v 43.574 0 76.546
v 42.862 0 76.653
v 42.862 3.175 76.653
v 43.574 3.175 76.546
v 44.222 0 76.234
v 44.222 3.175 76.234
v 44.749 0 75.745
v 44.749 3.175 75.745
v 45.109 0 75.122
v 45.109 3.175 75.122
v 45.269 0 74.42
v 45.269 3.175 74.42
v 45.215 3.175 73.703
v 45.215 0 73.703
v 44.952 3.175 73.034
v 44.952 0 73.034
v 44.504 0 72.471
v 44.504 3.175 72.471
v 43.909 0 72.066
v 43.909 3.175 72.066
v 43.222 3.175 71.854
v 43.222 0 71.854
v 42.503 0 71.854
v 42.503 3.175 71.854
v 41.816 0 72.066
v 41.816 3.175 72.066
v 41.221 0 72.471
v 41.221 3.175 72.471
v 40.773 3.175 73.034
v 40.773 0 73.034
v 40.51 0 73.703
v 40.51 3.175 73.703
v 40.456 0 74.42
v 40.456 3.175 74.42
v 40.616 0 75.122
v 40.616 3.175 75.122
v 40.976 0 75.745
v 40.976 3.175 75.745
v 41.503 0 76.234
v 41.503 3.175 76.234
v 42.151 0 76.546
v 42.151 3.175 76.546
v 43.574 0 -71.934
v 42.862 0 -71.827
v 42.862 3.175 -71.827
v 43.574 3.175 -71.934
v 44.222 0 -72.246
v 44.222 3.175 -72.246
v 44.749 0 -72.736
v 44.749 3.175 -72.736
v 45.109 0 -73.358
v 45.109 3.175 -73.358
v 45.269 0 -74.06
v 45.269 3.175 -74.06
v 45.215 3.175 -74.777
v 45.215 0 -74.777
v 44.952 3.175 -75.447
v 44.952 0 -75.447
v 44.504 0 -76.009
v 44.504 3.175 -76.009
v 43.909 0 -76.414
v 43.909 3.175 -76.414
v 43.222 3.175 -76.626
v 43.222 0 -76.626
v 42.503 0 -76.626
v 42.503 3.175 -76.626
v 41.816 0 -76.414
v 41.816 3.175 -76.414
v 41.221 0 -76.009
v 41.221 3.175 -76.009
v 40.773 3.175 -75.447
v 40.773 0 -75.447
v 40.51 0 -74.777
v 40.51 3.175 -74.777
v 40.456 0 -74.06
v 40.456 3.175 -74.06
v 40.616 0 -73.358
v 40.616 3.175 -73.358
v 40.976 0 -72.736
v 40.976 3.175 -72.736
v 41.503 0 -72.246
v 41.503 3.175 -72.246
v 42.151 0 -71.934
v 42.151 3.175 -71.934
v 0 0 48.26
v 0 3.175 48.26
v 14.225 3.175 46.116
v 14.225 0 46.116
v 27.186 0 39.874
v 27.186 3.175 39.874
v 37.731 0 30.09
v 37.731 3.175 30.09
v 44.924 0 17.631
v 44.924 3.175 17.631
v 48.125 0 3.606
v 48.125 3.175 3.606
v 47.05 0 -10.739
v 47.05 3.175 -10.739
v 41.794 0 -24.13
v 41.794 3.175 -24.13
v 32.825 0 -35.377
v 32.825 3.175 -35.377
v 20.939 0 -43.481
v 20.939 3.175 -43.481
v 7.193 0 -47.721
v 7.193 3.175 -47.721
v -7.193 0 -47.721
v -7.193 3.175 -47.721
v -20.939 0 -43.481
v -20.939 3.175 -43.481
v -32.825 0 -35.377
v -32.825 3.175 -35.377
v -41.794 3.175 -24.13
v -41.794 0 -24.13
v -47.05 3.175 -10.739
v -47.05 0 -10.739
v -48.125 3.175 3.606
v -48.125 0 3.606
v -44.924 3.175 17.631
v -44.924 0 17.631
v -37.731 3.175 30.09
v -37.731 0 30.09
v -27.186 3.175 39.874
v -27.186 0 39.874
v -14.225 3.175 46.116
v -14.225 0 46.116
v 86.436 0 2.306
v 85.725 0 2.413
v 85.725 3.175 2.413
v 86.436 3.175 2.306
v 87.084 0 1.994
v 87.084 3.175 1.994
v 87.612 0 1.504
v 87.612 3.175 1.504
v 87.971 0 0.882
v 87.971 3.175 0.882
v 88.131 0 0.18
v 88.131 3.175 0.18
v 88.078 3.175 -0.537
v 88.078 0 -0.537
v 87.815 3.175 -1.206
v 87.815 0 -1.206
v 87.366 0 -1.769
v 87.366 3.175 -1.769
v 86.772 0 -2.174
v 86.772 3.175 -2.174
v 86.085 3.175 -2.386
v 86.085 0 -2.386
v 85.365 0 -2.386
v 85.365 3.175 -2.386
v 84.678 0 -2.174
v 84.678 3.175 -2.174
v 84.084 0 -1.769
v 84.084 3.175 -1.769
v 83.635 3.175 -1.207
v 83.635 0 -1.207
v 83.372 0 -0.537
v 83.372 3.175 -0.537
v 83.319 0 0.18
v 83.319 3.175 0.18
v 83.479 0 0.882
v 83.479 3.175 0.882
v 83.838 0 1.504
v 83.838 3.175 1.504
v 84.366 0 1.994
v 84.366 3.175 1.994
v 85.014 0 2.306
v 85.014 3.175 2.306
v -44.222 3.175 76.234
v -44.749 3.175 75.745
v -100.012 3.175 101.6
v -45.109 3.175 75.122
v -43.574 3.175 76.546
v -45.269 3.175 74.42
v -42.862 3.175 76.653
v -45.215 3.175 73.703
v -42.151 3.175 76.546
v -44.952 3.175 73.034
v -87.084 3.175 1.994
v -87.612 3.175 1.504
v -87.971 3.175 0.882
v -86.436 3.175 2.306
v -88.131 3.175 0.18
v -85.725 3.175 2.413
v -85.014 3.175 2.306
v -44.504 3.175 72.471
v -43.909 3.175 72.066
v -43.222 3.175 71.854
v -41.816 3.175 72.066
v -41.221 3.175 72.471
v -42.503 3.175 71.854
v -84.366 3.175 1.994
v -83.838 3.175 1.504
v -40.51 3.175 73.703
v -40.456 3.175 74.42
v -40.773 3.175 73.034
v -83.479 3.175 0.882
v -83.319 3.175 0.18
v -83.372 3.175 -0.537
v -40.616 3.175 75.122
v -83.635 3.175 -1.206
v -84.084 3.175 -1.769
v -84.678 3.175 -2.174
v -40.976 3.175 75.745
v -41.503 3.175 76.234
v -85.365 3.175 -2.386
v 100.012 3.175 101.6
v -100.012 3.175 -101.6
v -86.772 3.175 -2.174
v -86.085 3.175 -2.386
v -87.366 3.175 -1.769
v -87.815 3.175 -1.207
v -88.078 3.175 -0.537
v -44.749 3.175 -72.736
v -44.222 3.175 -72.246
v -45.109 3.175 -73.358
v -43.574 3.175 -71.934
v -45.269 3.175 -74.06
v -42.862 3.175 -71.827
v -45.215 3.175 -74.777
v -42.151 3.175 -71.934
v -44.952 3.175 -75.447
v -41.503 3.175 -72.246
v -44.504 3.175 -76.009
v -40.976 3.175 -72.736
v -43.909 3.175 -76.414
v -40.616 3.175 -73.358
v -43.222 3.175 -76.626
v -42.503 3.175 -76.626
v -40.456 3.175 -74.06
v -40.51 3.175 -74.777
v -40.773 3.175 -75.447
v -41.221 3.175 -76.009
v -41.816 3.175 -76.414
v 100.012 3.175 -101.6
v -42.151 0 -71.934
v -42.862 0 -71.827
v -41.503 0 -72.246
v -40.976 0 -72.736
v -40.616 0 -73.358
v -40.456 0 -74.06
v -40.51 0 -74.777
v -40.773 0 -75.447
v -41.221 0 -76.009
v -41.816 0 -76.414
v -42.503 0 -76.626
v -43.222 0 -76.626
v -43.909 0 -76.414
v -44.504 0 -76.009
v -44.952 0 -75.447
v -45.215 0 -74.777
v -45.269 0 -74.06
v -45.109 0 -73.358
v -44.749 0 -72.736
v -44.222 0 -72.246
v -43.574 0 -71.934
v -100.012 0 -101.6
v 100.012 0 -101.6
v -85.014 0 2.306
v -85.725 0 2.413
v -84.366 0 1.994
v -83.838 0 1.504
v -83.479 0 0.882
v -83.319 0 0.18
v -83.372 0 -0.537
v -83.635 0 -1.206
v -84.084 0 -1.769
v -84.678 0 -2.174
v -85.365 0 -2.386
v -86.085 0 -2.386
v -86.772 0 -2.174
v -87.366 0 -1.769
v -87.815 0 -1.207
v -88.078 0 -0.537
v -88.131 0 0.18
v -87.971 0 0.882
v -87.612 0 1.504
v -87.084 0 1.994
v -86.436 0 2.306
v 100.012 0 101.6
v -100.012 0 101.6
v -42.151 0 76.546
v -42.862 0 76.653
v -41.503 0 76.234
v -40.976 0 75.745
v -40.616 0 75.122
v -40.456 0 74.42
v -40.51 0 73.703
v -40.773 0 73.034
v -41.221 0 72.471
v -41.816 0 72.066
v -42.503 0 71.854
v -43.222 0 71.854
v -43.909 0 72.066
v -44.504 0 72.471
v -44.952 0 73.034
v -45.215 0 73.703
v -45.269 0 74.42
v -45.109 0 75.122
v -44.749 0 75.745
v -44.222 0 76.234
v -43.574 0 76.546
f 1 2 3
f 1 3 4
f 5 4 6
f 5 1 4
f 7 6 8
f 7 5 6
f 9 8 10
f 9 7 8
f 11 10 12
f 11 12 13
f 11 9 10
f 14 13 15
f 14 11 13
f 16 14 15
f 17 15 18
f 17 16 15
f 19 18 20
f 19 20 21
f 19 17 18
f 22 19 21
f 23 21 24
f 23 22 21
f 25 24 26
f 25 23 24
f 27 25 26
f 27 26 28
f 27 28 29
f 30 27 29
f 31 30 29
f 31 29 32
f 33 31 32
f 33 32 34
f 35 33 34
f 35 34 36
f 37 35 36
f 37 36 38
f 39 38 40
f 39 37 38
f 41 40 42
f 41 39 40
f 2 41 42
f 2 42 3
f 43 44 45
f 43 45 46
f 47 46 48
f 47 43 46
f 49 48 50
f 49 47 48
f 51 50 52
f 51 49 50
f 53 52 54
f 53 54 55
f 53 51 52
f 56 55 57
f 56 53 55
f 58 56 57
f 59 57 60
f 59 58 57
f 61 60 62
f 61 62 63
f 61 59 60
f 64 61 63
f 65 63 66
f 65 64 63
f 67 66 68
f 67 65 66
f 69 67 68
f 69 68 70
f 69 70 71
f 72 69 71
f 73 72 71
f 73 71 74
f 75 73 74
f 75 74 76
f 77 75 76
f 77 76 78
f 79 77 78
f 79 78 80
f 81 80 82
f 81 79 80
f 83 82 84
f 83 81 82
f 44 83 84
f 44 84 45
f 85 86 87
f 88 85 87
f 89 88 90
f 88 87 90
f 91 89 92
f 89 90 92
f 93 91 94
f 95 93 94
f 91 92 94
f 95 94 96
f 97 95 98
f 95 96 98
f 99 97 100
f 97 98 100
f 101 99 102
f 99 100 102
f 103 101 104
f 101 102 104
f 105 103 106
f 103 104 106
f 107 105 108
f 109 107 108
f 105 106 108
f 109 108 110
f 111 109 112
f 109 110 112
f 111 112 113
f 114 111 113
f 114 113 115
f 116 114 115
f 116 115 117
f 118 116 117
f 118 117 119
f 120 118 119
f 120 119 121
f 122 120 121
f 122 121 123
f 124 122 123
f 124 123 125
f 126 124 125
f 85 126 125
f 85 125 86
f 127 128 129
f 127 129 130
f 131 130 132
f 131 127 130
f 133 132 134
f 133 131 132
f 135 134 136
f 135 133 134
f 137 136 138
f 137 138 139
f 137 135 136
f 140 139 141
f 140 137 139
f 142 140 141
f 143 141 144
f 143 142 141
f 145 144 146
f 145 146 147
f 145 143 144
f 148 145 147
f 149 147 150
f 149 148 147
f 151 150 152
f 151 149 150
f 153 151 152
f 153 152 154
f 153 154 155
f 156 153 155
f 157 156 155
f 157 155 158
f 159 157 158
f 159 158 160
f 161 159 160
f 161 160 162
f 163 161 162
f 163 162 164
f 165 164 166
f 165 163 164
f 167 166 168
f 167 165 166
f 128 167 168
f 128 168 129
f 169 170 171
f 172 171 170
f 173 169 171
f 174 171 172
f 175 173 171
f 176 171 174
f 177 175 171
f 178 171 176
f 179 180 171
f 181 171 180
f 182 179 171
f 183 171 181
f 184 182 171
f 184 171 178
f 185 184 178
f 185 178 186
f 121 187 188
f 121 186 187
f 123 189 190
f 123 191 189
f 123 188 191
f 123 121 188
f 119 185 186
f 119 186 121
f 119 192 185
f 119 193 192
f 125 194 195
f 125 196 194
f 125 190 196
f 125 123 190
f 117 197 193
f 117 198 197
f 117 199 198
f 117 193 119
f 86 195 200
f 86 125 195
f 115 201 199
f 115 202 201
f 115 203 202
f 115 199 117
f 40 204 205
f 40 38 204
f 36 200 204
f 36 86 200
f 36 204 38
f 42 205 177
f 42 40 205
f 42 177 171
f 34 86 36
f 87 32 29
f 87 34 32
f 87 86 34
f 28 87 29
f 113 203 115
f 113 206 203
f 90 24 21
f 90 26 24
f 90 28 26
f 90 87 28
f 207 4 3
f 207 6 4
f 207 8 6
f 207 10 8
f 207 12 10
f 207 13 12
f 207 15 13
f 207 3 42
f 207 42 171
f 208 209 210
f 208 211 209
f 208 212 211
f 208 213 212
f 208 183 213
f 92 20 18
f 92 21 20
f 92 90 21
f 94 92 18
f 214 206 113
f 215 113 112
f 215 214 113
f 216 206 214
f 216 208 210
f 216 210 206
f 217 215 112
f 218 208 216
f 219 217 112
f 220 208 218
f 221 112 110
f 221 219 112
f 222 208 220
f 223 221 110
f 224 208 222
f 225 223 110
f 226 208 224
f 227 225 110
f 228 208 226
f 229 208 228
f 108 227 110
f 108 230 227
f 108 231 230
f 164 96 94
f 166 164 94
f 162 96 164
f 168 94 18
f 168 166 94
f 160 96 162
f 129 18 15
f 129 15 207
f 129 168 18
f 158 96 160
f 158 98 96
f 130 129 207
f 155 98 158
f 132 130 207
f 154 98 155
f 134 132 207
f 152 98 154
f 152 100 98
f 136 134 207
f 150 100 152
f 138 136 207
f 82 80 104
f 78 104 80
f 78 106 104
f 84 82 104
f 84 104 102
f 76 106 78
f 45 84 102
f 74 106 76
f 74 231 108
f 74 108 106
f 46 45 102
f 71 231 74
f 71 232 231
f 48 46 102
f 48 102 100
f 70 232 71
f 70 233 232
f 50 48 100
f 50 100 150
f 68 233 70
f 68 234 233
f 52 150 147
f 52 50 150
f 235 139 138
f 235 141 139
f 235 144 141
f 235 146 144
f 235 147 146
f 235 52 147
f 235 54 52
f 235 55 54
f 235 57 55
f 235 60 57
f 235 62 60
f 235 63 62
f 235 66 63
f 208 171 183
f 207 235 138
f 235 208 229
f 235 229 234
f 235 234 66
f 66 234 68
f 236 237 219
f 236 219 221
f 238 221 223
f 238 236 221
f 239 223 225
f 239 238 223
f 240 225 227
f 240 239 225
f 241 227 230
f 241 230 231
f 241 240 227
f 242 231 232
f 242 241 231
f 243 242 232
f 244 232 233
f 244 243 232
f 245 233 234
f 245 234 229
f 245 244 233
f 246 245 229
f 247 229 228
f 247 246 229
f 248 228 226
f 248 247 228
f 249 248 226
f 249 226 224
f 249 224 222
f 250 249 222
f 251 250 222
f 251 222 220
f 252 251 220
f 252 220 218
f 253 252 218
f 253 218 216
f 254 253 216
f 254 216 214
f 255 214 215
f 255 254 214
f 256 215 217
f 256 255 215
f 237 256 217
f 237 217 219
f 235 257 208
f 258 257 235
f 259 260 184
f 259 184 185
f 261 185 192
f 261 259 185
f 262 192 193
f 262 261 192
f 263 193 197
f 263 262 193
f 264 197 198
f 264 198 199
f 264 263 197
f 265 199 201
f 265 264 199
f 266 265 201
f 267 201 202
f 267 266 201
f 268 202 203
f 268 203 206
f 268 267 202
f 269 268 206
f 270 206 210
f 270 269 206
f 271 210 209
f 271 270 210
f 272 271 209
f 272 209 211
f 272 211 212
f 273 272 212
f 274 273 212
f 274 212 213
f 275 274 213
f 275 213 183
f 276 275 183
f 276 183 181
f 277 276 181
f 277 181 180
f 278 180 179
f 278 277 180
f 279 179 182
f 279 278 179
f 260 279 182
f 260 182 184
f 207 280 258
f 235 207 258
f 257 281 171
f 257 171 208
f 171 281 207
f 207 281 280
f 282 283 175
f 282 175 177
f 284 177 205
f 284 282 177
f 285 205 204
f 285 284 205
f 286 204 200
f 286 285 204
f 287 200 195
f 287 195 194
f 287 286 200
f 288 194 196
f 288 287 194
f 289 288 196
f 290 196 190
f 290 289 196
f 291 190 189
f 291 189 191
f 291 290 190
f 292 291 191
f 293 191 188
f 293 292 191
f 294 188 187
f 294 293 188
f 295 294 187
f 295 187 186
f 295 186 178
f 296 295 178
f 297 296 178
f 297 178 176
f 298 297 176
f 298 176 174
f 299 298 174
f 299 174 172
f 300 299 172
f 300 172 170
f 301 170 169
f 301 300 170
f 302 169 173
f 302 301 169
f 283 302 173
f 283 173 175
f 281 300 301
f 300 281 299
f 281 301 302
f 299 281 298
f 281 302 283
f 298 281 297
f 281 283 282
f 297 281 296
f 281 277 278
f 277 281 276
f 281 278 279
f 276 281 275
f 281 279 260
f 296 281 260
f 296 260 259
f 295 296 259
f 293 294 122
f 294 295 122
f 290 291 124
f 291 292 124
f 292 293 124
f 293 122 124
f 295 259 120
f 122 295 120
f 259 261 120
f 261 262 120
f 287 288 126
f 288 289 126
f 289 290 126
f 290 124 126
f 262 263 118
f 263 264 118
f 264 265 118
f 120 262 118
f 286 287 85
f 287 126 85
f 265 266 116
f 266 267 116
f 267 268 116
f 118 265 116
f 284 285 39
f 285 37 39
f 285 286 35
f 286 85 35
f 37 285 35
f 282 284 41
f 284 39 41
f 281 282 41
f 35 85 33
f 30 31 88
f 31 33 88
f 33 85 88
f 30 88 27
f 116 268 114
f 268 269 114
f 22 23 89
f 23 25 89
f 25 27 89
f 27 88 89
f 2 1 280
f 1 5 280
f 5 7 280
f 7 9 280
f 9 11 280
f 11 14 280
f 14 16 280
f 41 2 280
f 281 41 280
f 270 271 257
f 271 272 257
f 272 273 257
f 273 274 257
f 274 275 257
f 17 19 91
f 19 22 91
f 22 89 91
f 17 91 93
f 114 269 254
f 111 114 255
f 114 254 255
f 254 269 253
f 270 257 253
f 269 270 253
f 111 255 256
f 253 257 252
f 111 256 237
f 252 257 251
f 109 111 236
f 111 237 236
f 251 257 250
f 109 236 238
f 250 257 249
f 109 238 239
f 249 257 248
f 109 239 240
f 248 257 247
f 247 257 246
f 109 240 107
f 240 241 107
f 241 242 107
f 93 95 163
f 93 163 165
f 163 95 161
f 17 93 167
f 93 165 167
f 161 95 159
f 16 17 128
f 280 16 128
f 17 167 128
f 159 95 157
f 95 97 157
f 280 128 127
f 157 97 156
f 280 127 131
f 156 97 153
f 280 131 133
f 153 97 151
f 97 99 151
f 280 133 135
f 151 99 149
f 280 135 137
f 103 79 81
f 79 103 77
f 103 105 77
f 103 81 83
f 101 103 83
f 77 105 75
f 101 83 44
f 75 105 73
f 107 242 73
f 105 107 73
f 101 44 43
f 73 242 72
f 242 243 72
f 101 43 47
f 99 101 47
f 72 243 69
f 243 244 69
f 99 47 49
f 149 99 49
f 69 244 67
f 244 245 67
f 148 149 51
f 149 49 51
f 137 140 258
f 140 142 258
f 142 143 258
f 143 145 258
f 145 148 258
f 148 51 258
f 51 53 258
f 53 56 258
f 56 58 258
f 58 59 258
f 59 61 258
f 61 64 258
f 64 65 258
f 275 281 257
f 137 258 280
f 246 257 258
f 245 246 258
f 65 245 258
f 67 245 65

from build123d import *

# Parameters (mm, degrees)
SKETCH1_W           = 200.025
SKETCH1_H           = 203.2
SKETCH1_R           = 2.413
BOSS_EXTRUDE1_DEPTH = 3.175
SKETCH3_R           = 48.26
CUT_EXTRUDE1_DEPTH  = 143.601335131


with BuildPart() as part:
    # Sketch1 → Boss-Extrude1 (new body)
    with BuildSketch(Plane(origin=(0, 0, 0), x_dir=(1, 0, 0), z_dir=(0, 1, 0))):
        Rectangle(SKETCH1_W, SKETCH1_H)
        with Locations(Location((42.8625, 74.240027739, 0), (0, 0, 270))):
            Circle(SKETCH1_R, mode=Mode.SUBTRACT)
        with Locations(Location((85.725, 0, 0), (0, 0, 270))):
            Circle(SKETCH1_R, mode=Mode.SUBTRACT)
        with Locations(Location((42.8625, -74.240027739, 0), (0, 0, 270))):
            Circle(SKETCH1_R, mode=Mode.SUBTRACT)
        with Locations(Location((-42.8625, -74.240027739, 0), (0, 0, 270))):
            Circle(SKETCH1_R, mode=Mode.SUBTRACT)
        with Locations(Location((-85.725, 0, 0), (0, 0, 270))):
            Circle(SKETCH1_R, mode=Mode.SUBTRACT)
        with Locations(Location((-42.8625, 74.240027739, 0), (0, 0, 270))):
            Circle(SKETCH1_R, mode=Mode.SUBTRACT)
    extrude(amount=BOSS_EXTRUDE1_DEPTH)

    # Sketch3 → Cut-Extrude1 (cut, through all)
    with BuildSketch(Plane(origin=(0, 3.175, 0), x_dir=(1, 0, 0), z_dir=(0, 1, 0))):
        with Locations(Location((0, 0, 0), (0, 0, 270))):
            Circle(SKETCH3_R)
    extrude(amount=-CUT_EXTRUDE1_DEPTH, mode=Mode.SUBTRACT)


solid = part.part
